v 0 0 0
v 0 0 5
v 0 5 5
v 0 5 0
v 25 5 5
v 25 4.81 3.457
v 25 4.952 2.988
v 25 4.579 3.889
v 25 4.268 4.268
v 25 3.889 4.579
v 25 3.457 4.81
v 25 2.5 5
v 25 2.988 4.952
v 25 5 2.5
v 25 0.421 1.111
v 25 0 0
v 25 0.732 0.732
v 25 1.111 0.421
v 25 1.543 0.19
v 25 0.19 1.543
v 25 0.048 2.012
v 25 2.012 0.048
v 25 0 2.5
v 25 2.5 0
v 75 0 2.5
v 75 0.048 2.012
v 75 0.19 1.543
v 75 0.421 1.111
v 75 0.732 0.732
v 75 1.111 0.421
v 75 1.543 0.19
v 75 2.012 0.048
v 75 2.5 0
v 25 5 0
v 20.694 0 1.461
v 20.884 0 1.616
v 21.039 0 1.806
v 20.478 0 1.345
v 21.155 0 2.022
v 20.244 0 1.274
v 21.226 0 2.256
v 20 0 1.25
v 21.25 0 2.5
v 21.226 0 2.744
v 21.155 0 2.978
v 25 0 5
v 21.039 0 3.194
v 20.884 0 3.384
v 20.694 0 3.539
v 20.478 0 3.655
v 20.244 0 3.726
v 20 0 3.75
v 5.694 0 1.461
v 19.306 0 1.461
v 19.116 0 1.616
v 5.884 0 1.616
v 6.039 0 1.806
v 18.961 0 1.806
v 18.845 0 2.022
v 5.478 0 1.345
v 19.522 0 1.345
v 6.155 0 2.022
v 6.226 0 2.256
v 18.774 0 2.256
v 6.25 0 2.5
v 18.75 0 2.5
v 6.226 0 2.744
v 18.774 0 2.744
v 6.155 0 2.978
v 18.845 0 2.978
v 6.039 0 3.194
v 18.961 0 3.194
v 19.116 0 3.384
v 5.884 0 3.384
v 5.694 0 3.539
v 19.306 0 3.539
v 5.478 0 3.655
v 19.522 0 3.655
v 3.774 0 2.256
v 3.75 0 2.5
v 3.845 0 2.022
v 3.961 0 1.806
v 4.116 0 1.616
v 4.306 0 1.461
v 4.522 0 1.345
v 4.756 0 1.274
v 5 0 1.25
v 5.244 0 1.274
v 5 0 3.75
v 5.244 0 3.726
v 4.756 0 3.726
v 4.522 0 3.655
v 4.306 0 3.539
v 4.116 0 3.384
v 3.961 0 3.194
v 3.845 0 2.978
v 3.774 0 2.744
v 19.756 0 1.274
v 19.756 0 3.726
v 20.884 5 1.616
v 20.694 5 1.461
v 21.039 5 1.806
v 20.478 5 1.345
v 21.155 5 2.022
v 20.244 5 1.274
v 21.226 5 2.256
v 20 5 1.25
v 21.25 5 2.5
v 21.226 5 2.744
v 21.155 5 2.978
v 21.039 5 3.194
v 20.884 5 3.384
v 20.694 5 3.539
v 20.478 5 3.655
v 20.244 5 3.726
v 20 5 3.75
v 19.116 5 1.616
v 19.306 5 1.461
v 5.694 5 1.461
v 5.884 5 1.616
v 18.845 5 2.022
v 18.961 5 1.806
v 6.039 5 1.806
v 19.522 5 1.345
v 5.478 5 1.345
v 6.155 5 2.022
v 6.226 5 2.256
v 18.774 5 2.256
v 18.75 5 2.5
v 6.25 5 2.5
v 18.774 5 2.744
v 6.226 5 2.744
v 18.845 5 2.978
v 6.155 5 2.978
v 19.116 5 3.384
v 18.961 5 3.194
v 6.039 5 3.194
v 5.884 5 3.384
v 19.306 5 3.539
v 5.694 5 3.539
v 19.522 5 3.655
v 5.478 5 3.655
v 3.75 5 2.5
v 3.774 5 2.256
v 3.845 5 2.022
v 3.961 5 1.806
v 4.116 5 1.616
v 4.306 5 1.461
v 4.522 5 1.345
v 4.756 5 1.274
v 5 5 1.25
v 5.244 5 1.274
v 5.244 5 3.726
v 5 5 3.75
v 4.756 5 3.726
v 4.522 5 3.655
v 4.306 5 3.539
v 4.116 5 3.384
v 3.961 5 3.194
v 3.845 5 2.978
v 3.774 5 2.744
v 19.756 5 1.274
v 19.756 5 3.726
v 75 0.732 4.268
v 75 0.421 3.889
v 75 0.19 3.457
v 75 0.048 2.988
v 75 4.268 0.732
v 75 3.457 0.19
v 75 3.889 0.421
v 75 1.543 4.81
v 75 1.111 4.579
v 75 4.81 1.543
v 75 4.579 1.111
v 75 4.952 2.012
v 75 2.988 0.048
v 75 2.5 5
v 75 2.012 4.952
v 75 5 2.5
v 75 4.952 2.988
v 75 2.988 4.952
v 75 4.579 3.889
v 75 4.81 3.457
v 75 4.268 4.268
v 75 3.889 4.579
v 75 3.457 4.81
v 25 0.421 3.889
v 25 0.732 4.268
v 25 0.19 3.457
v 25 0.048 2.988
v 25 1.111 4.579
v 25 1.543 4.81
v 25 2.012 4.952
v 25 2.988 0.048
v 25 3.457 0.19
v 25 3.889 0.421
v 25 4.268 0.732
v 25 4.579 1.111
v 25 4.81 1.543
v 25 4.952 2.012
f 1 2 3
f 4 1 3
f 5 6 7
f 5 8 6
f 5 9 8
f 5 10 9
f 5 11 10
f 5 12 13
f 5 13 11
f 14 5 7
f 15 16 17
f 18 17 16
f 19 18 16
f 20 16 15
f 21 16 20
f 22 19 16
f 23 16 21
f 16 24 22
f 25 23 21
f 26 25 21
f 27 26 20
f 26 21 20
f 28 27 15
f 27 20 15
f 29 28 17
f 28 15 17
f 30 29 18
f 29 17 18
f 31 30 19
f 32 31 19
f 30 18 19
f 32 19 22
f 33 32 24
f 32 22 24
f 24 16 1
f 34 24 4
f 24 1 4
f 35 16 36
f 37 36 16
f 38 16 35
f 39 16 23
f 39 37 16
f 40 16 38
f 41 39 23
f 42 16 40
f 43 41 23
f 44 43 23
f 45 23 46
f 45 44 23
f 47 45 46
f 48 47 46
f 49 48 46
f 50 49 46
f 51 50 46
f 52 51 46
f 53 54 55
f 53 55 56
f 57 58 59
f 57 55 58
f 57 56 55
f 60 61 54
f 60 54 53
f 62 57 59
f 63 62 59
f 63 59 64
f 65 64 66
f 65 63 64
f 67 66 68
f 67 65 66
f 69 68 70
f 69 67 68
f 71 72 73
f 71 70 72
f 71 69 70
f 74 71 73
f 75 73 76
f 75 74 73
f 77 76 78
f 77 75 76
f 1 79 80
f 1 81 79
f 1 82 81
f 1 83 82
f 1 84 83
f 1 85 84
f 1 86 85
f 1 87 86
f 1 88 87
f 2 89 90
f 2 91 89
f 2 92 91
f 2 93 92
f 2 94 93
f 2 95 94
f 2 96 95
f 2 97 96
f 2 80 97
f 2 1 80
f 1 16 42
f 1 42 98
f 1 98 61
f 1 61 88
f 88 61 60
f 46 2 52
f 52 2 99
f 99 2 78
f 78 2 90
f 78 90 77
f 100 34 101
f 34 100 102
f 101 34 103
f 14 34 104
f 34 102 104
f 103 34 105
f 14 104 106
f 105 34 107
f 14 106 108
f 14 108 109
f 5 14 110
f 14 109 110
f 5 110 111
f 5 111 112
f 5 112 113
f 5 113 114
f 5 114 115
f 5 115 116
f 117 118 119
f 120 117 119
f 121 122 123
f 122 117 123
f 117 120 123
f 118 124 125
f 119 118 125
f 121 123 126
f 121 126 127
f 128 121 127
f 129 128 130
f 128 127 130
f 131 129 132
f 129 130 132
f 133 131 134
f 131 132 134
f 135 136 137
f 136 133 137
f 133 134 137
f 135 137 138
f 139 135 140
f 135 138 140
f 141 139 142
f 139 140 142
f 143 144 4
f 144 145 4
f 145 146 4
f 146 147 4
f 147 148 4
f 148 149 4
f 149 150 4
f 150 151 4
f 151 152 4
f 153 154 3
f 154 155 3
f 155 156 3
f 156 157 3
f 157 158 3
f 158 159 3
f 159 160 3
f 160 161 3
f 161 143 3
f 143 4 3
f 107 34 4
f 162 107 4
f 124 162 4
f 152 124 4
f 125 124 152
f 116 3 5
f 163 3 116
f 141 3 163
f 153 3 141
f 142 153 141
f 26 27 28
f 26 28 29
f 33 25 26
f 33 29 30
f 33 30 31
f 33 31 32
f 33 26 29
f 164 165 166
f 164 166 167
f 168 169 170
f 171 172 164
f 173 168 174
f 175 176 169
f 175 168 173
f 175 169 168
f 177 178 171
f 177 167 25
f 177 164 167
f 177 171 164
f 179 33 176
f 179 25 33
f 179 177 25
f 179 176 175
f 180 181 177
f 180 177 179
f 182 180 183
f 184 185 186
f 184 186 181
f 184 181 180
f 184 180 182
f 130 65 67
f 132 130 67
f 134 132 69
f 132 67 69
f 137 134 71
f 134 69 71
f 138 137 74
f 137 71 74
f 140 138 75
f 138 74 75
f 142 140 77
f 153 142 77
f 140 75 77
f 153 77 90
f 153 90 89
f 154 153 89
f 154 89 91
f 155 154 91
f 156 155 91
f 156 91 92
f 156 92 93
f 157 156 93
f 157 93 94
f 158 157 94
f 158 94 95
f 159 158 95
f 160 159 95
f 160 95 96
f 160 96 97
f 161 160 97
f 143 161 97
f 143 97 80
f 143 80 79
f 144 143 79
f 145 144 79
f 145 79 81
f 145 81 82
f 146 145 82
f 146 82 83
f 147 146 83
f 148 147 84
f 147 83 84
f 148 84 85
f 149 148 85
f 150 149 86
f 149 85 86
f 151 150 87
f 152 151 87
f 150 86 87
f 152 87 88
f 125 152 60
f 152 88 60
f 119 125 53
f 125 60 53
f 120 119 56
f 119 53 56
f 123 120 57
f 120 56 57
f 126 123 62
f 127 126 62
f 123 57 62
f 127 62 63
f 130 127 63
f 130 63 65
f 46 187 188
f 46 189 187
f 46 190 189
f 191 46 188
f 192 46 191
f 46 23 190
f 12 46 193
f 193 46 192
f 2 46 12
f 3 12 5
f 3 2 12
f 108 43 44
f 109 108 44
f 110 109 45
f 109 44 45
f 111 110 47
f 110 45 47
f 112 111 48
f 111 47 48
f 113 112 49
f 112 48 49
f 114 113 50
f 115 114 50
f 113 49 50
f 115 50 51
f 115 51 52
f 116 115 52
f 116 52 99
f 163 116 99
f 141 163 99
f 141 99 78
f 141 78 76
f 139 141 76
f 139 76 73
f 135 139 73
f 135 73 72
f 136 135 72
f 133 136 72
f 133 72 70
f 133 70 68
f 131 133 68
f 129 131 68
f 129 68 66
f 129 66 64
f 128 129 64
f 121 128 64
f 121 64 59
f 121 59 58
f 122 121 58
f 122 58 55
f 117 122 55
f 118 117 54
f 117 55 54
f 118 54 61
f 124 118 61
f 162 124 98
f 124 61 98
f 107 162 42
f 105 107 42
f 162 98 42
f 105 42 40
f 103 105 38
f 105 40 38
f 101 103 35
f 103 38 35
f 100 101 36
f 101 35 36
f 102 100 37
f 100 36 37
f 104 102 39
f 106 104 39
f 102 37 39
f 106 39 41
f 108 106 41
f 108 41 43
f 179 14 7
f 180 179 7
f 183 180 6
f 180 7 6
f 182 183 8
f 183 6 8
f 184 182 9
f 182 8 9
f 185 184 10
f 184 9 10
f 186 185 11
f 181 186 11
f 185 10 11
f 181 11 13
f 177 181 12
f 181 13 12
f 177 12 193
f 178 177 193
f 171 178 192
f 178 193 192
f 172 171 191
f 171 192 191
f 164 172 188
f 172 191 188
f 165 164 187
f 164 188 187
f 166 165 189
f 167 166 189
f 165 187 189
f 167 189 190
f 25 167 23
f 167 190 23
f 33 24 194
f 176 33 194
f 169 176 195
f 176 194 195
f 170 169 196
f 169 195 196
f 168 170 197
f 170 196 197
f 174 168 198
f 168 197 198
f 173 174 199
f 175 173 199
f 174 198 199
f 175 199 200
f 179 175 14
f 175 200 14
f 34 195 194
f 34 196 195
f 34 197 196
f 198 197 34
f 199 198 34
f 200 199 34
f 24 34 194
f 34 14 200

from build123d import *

# Parameters (mm, degrees)
F0_W     = 5
F0_H     = 5
F1_DEPTH = 25
F3_DEPTH = 50
F4_R     = 1.25
F5_DEPTH = 25


with BuildPart() as f1:
    # F0 (on Right) → F1 (new body)
    with BuildSketch(Plane.YZ):
        with Locations((2.5, 2.5)):
            Rectangle(F0_W, F0_H)
    extrude(amount=F1_DEPTH)

    # F2 (on face) → F3 (join)
    with BuildSketch(Plane.YZ.offset(25)):
        with BuildLine():
            ThreePointArc((2.5, 0), (4.267767, 0.732233), (5, 2.5))
            ThreePointArc((5, 2.5), (4.267767, 4.267767), (2.5, 5))
            ThreePointArc((2.5, 5), (0.732233, 4.267767), (0, 2.5))
            ThreePointArc((0, 2.5), (0.732233, 0.732233), (2.5, 0))
        make_face()
    extrude(amount=F3_DEPTH)

    # F4 (on face) → F5 (cut)
    with BuildSketch(Plane.XZ):
        with Locations((5, 2.5)):
            Circle(F4_R)
        with Locations((20, 2.5)):
            Circle(F4_R)
    extrude(amount=-F5_DEPTH, mode=Mode.SUBTRACT)


solid = f1.part
